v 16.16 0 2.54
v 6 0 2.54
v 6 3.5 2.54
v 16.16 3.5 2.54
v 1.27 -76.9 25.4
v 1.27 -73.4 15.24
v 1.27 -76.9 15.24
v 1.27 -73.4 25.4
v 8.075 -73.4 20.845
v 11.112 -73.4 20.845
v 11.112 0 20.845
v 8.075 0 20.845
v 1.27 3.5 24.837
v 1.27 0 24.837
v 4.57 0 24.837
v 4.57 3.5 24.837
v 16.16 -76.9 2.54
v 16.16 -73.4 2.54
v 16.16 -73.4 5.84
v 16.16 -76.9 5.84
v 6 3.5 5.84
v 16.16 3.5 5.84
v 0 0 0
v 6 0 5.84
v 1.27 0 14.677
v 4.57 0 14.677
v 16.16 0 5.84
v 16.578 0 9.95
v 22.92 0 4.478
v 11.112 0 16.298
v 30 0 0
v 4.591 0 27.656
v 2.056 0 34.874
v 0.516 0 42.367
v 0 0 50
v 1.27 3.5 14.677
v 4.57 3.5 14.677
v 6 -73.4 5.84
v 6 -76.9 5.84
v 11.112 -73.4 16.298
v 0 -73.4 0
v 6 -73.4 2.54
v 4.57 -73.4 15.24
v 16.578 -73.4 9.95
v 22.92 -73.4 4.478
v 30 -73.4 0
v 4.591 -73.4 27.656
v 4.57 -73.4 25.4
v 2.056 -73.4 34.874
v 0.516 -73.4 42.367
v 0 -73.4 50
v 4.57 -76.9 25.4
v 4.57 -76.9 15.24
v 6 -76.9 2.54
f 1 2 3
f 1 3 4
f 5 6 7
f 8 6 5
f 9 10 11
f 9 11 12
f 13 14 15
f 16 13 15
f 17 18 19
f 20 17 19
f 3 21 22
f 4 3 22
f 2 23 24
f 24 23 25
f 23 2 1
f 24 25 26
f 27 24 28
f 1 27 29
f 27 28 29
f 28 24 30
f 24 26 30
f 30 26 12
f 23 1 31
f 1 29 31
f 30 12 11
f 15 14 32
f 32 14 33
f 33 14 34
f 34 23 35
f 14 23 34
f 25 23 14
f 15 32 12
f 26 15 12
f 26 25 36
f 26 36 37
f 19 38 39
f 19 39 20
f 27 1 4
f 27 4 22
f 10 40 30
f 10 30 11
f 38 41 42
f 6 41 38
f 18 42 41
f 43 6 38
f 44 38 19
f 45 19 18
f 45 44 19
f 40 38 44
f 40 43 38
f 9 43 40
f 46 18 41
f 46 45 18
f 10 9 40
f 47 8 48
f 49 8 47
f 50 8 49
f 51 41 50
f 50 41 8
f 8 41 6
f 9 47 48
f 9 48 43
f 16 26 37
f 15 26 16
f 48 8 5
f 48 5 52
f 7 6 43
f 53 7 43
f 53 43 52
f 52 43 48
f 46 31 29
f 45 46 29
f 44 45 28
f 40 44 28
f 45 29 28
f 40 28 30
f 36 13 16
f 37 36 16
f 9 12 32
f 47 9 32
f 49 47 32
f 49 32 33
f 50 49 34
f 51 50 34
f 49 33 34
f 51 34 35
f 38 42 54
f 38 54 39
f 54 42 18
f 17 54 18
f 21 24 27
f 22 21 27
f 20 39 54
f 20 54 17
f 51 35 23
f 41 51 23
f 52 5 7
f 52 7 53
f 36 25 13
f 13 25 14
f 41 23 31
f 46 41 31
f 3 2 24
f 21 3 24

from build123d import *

# Parameters (mm, degrees)
F0_W     = 10.16
F0_H     = 3.3
F0_W_2   = 3.3
F0_H_2   = 10.16
F1_DEPTH = 73.4
F2_DEPTH = 3.5
F4_W     = 3.3
F4_H     = 10.16
F4_W_2   = 10.16
F4_H_2   = 3.3
F5_DEPTH = 3.5
F7_DEPTH = 73.4


with BuildPart() as f1:
    # F0 (on Front) → F1 (new body)
    with BuildSketch(Plane.XZ):
        with BuildLine():
            Line((0, 50), (0, 0))
            Line((0, 0), (30, 0))
            ThreePointArc((30, 0), (8.0754008763, 20.8452405258), (0, 50))
        make_face()
        with Locations((11.08, 4.19)):
            Rectangle(F0_W, F0_H, mode=Mode.SUBTRACT)
        with Locations((2.92, 19.7566125902)):
            Rectangle(F0_W_2, F0_H_2, mode=Mode.SUBTRACT)
        with Locations((2.92, 19.7566125902)):
            Rectangle(F0_W_2, F0_H_2)
        with Locations((11.08, 4.19)):
            Rectangle(F0_W, F0_H)
    extrude(amount=F1_DEPTH)

    # F0 (on Front) → F2 (join)
    with BuildSketch(Plane.XZ):
        with Locations((2.92, 19.7566125902)):
            Rectangle(F0_W_2, F0_H_2)
        with Locations((11.08, 4.19)):
            Rectangle(F0_W, F0_H)
    extrude(amount=-F2_DEPTH)

    # F4 (on offset) → F5 (join)
    with BuildSketch(Plane.XZ.offset(73.4)):
        with Locations((2.92, 20.32)):
            Rectangle(F4_W, F4_H)
        with Locations((11.08, 4.19)):
            Rectangle(F4_W_2, F4_H_2)
    extrude(amount=F5_DEPTH)

    # F6 (on offset) → F7 (join)
    with BuildSketch(Plane.XZ.offset(73.4)):
        with BuildLine():
            ThreePointArc((8.0754008763, 20.8452405258), (9.5386255261, 18.5347993911), (11.1116185287, 16.297645479))
            Line((11.1116185287, 16.297645479), (11.1116185287, 20.8452405258))
            Line((11.1116185287, 20.8452405258), (10.6401696458, 20.8452405258))
            Line((10.6401696458, 20.8452405258), (8.0754008763, 20.8452405258))
        make_face()
    extrude(amount=-F7_DEPTH)


solid = f1.part
